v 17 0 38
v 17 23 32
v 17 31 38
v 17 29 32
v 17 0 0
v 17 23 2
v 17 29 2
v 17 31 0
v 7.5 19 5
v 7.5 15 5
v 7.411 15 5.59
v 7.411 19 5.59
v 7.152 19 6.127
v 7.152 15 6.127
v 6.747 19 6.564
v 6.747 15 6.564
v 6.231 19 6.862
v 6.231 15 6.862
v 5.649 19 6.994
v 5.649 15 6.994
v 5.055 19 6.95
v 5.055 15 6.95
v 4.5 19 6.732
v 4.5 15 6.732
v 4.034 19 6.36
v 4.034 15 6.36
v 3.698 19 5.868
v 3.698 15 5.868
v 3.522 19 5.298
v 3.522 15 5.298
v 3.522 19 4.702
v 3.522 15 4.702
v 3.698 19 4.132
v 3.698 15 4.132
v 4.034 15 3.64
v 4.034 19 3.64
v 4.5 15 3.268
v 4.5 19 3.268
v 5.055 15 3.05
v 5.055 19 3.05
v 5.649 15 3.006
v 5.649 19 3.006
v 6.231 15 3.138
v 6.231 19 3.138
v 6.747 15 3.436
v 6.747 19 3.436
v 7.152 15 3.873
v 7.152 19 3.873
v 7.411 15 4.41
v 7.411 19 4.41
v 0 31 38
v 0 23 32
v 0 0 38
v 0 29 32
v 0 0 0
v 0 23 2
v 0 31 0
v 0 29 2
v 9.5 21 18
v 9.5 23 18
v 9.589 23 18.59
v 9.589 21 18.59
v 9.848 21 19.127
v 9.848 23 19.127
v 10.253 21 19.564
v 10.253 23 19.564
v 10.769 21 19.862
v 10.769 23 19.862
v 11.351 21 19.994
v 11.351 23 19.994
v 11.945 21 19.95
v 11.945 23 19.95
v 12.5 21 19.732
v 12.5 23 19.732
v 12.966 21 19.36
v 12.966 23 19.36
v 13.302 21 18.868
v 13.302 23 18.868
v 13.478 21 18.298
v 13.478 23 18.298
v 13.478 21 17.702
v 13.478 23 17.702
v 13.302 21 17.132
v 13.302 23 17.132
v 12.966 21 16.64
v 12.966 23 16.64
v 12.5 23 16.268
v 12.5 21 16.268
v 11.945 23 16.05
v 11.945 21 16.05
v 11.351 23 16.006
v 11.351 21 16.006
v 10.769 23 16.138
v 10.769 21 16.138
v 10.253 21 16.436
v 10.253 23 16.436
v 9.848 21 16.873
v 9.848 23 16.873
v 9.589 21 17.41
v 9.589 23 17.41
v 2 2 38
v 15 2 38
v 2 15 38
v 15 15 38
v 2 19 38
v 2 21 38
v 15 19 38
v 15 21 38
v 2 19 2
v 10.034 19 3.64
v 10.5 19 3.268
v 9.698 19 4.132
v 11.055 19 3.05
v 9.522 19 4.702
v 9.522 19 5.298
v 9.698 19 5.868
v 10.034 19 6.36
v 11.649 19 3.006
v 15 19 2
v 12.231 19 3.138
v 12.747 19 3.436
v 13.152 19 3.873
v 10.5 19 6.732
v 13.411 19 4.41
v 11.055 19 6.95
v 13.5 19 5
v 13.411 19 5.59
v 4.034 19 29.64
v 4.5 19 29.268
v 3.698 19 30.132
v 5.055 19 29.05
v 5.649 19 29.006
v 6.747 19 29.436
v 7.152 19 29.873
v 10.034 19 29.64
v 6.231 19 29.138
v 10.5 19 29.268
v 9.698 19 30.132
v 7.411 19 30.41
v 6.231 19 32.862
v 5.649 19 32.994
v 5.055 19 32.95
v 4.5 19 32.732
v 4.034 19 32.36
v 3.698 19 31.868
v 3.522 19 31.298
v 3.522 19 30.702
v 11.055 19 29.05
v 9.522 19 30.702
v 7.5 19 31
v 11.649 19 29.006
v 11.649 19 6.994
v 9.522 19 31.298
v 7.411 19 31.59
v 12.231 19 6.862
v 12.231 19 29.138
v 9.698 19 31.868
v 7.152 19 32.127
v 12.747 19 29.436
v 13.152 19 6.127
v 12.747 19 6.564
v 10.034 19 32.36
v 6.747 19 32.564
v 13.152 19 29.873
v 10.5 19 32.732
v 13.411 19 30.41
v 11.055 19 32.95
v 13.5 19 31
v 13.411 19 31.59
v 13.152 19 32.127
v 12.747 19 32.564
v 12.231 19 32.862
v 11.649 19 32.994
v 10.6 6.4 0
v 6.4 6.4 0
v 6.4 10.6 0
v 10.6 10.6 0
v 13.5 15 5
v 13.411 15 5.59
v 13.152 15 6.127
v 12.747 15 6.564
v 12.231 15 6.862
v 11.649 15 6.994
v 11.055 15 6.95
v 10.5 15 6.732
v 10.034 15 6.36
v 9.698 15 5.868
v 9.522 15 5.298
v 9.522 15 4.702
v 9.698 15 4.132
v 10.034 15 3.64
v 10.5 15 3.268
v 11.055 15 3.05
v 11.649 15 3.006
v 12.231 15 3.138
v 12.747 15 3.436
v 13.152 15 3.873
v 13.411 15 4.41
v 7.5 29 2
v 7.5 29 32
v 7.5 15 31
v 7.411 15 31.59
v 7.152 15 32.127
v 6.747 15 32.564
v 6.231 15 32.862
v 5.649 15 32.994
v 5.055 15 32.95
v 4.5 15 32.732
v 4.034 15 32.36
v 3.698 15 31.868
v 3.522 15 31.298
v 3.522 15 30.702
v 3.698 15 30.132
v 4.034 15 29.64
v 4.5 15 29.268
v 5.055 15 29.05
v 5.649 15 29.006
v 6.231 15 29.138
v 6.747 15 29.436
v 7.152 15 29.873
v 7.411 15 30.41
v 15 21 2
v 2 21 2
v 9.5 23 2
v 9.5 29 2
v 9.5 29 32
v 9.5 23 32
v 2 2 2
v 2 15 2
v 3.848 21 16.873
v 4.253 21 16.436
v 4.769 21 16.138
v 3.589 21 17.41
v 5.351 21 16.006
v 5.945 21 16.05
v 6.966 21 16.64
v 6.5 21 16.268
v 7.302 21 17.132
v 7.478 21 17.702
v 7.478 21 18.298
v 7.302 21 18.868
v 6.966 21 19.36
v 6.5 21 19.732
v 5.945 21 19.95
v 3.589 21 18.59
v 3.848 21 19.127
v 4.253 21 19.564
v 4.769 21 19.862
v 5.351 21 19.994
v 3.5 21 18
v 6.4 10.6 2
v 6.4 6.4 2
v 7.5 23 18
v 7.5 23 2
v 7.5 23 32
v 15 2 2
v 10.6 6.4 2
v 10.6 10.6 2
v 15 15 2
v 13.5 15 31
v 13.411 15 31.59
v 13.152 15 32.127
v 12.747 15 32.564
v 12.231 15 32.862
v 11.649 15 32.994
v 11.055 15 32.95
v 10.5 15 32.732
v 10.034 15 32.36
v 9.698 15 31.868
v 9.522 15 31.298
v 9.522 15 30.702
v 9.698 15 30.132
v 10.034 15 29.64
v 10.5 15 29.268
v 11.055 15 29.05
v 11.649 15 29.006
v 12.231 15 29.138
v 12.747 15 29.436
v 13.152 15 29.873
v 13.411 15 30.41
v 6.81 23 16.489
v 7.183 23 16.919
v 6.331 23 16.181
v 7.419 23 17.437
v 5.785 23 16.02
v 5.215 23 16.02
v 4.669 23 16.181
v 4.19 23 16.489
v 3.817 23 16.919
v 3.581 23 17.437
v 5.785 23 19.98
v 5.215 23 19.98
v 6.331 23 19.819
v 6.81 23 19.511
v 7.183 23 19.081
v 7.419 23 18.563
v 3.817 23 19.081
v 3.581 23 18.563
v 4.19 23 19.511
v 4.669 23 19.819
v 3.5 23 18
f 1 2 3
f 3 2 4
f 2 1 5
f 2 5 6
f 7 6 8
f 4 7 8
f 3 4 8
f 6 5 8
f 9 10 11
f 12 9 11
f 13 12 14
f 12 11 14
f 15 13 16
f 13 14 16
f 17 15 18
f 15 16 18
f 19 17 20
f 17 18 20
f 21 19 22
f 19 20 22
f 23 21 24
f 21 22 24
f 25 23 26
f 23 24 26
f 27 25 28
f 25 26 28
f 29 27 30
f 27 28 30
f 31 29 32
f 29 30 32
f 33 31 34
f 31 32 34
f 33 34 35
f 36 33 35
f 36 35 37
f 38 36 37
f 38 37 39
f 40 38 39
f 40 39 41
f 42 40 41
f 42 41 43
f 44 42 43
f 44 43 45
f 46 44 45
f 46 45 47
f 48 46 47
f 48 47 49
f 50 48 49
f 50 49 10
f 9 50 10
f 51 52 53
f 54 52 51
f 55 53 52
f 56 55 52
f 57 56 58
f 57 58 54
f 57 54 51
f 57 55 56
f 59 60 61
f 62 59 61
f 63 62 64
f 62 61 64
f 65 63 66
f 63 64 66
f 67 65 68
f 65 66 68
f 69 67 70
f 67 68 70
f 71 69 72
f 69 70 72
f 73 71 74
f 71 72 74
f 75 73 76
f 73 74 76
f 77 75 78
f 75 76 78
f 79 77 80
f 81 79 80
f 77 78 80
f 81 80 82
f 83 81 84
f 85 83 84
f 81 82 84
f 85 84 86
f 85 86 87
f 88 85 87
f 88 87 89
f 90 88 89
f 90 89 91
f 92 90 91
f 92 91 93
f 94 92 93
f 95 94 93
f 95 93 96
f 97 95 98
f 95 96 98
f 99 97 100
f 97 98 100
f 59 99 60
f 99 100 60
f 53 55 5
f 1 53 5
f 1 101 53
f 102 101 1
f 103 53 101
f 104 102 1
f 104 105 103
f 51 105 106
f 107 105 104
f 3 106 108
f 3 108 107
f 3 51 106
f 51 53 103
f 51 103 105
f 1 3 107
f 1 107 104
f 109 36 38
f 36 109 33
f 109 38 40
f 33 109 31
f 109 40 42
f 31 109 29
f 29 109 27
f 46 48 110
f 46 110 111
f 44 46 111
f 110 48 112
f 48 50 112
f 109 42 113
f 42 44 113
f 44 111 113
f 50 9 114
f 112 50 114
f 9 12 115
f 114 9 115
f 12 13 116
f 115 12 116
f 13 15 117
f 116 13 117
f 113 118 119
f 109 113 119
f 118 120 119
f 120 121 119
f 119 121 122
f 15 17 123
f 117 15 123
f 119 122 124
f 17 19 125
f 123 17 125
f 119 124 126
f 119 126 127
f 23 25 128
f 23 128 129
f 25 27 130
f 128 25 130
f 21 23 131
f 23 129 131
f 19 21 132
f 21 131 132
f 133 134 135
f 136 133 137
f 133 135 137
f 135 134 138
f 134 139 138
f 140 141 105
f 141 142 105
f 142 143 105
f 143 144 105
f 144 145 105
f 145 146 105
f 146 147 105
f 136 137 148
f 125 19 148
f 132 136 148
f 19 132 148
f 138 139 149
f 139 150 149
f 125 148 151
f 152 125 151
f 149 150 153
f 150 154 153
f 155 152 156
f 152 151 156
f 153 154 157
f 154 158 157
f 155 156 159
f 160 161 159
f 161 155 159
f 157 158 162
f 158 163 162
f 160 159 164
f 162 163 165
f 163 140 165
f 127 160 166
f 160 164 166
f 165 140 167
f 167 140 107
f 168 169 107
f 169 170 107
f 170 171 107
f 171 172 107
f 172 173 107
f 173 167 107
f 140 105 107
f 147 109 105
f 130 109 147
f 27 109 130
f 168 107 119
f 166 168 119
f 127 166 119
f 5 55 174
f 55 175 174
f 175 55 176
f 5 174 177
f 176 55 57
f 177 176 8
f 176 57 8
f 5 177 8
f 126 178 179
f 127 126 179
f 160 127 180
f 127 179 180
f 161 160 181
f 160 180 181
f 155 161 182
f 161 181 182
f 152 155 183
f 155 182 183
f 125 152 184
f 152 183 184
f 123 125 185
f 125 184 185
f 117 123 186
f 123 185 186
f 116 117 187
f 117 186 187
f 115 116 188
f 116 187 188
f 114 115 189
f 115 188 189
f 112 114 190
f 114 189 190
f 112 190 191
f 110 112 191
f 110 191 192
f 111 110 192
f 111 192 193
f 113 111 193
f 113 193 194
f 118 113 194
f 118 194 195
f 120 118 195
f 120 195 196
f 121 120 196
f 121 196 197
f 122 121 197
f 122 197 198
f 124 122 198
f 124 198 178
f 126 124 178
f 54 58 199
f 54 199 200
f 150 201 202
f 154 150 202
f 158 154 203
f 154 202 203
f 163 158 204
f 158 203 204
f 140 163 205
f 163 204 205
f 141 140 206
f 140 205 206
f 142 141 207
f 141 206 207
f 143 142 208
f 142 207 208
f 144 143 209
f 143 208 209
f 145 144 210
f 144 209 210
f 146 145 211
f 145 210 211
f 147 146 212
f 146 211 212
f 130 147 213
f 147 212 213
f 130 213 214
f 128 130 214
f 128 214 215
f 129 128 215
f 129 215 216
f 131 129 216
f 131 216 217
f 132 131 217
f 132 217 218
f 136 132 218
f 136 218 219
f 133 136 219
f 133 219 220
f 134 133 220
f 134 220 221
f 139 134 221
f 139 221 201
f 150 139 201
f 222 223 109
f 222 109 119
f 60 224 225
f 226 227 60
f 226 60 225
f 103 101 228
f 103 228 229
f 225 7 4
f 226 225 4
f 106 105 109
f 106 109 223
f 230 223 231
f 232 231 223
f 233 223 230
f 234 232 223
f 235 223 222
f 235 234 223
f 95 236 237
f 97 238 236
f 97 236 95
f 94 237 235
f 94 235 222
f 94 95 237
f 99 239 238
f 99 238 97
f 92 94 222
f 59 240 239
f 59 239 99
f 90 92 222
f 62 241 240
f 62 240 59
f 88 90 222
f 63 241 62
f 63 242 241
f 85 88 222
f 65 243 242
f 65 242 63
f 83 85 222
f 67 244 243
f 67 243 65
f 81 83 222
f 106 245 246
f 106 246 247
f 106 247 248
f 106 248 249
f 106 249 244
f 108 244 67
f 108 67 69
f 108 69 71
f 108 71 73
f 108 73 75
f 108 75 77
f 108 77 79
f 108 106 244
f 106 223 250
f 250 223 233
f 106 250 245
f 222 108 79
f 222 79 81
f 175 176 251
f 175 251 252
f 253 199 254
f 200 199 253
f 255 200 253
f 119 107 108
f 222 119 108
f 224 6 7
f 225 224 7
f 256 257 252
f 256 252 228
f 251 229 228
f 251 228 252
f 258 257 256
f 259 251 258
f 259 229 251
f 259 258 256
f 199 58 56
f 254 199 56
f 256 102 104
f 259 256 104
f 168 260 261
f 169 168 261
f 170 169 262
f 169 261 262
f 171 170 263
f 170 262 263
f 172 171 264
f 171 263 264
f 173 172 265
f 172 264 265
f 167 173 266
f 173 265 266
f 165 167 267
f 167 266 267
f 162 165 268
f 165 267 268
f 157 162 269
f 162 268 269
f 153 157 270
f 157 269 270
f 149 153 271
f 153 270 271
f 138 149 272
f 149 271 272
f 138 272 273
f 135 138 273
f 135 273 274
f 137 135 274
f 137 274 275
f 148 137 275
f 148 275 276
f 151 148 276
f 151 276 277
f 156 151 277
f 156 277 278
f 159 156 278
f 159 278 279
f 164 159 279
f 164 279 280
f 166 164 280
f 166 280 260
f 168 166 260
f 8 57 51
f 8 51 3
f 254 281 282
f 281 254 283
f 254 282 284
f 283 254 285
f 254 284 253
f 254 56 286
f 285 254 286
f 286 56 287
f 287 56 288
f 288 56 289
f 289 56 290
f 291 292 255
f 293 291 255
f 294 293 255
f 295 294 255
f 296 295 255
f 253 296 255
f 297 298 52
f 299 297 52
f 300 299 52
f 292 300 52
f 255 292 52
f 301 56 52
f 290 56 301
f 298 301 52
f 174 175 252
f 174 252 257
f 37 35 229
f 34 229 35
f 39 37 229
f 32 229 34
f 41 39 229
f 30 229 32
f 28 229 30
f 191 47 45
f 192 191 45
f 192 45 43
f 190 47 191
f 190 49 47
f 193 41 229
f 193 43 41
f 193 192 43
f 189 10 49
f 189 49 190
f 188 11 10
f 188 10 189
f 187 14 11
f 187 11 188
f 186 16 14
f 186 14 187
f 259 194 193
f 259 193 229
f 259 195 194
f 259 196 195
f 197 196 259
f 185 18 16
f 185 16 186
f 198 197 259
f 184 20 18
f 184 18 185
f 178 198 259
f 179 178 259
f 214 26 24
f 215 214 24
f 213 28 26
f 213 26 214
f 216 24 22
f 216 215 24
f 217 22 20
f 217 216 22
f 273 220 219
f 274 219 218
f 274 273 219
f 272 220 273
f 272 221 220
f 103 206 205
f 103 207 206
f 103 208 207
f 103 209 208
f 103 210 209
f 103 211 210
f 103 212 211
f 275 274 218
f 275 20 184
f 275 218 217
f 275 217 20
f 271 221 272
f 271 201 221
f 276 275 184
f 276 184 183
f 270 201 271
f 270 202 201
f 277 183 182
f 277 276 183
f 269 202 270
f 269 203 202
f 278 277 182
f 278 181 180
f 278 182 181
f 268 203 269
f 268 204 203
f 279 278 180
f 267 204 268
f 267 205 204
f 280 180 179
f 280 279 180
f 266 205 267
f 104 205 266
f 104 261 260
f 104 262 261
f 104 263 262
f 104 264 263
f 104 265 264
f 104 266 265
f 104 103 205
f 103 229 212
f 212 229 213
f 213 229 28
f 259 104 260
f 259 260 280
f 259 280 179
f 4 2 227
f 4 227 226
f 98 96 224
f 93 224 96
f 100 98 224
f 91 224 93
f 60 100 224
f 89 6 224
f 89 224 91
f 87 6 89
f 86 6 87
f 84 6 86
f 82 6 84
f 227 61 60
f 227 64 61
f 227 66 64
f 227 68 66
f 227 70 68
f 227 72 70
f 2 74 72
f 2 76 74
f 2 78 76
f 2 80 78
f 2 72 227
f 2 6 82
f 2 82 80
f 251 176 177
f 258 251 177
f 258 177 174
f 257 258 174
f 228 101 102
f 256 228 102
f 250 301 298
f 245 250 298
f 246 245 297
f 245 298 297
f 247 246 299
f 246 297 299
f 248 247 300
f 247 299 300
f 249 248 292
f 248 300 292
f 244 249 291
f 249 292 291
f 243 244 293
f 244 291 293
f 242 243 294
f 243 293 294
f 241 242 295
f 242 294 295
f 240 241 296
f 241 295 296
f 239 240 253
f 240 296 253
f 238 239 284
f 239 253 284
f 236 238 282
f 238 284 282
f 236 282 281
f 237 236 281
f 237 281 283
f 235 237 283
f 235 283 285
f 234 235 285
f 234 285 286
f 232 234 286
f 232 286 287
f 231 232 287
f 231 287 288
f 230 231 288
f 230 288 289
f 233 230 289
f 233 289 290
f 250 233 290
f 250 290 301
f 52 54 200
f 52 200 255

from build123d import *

# Parameters (mm, degrees)
SKETCH_W        = 17
SKETCH_H        = 31
PAD_DEPTH       = 38
SKETCH002_W     = 13
SKETCH002_H     = 13
POCKET001_DEPTH = 36
SKETCH003_W     = 4.2
SKETCH003_H     = 4.2
POCKET002_DEPTH = 5
SKETCH001_W     = 13
SKETCH001_H     = 2
POCKET_DEPTH    = 36
SKETCH004_W     = 6
SKETCH004_H     = 30
POCKET003_DEPTH = 7.5
SKETCH006_W     = 6
SKETCH006_H     = 30
POCKET004_DEPTH = 7.5
SKETCH007_R     = 2
POCKET005_DEPTH = 5
SKETCH008_R     = 2
POCKET006_DEPTH = 2


with BuildPart() as part:
    # Sketch → Pad (new body)
    with BuildSketch(Plane.XY):
        with Locations((8.5, 15.5)):
            Rectangle(SKETCH_W, SKETCH_H)
    extrude(amount=PAD_DEPTH)

    # Sketch002 (on DatumPlane) → Pocket001 (cut)
    with BuildSketch(Plane.XY.offset(38)):
        with Locations((8.5, 8.5)):
            Rectangle(SKETCH002_W, SKETCH002_H)
    extrude(amount=-POCKET001_DEPTH, mode=Mode.SUBTRACT)

    # Sketch003 (on DatumPlane) → Pocket002 (cut)
    with BuildSketch(Plane(origin=(0, 0, 0), x_dir=(1, 0, 0), z_dir=(0, 0, -1))):
        with Locations((8.5, -8.5)):
            Rectangle(SKETCH003_W, SKETCH003_H)
    extrude(amount=-POCKET002_DEPTH, mode=Mode.SUBTRACT)

    # Sketch001 (on DatumPlane) → Pocket (cut)
    with BuildSketch(Plane.XY.offset(38)):
        with Locations((8.5, 20)):
            Rectangle(SKETCH001_W, SKETCH001_H)
    extrude(amount=-POCKET_DEPTH, mode=Mode.SUBTRACT)

    # Sketch004 (on DatumPlane) → Pocket003 (cut)
    with BuildSketch(Plane(origin=(0, 0, 0), x_dir=(0, -1, 0), z_dir=(-1, 0, 0))):
        with Locations((-26, 17)):
            Rectangle(SKETCH004_W, SKETCH004_H)
    extrude(amount=-POCKET003_DEPTH, mode=Mode.SUBTRACT)

    # Sketch006 (on DatumPlane) → Pocket004 (cut)
    with BuildSketch(Plane.YZ.offset(17)):
        with Locations((26, 17)):
            Rectangle(SKETCH006_W, SKETCH006_H)
    extrude(amount=-POCKET004_DEPTH, mode=Mode.SUBTRACT)

    # Sketch007 (on DatumPlane) → Pocket005 (cut)
    with BuildSketch(Plane.XZ.offset(-15)):
        with Locations((5.5, 31)):
            Circle(SKETCH007_R)
        with Locations((11.5, 31)):
            Circle(SKETCH007_R)
        with Locations((5.5, 5)):
            Circle(SKETCH007_R)
        with Locations((11.5, 5)):
            Circle(SKETCH007_R)
    extrude(amount=-POCKET005_DEPTH, mode=Mode.SUBTRACT)

    # Sketch008 (on DatumPlane) → Pocket006 (cut)
    with BuildSketch(Plane(origin=(0, 23, 0), x_dir=(-1, 0, 0), z_dir=(0, 1, 0))):
        with Locations((-5.5, 18)):
            Circle(SKETCH008_R)
        with Locations((-11.5, 18)):
            Circle(SKETCH008_R)
    extrude(amount=-POCKET006_DEPTH, mode=Mode.SUBTRACT)


solid = part.part
